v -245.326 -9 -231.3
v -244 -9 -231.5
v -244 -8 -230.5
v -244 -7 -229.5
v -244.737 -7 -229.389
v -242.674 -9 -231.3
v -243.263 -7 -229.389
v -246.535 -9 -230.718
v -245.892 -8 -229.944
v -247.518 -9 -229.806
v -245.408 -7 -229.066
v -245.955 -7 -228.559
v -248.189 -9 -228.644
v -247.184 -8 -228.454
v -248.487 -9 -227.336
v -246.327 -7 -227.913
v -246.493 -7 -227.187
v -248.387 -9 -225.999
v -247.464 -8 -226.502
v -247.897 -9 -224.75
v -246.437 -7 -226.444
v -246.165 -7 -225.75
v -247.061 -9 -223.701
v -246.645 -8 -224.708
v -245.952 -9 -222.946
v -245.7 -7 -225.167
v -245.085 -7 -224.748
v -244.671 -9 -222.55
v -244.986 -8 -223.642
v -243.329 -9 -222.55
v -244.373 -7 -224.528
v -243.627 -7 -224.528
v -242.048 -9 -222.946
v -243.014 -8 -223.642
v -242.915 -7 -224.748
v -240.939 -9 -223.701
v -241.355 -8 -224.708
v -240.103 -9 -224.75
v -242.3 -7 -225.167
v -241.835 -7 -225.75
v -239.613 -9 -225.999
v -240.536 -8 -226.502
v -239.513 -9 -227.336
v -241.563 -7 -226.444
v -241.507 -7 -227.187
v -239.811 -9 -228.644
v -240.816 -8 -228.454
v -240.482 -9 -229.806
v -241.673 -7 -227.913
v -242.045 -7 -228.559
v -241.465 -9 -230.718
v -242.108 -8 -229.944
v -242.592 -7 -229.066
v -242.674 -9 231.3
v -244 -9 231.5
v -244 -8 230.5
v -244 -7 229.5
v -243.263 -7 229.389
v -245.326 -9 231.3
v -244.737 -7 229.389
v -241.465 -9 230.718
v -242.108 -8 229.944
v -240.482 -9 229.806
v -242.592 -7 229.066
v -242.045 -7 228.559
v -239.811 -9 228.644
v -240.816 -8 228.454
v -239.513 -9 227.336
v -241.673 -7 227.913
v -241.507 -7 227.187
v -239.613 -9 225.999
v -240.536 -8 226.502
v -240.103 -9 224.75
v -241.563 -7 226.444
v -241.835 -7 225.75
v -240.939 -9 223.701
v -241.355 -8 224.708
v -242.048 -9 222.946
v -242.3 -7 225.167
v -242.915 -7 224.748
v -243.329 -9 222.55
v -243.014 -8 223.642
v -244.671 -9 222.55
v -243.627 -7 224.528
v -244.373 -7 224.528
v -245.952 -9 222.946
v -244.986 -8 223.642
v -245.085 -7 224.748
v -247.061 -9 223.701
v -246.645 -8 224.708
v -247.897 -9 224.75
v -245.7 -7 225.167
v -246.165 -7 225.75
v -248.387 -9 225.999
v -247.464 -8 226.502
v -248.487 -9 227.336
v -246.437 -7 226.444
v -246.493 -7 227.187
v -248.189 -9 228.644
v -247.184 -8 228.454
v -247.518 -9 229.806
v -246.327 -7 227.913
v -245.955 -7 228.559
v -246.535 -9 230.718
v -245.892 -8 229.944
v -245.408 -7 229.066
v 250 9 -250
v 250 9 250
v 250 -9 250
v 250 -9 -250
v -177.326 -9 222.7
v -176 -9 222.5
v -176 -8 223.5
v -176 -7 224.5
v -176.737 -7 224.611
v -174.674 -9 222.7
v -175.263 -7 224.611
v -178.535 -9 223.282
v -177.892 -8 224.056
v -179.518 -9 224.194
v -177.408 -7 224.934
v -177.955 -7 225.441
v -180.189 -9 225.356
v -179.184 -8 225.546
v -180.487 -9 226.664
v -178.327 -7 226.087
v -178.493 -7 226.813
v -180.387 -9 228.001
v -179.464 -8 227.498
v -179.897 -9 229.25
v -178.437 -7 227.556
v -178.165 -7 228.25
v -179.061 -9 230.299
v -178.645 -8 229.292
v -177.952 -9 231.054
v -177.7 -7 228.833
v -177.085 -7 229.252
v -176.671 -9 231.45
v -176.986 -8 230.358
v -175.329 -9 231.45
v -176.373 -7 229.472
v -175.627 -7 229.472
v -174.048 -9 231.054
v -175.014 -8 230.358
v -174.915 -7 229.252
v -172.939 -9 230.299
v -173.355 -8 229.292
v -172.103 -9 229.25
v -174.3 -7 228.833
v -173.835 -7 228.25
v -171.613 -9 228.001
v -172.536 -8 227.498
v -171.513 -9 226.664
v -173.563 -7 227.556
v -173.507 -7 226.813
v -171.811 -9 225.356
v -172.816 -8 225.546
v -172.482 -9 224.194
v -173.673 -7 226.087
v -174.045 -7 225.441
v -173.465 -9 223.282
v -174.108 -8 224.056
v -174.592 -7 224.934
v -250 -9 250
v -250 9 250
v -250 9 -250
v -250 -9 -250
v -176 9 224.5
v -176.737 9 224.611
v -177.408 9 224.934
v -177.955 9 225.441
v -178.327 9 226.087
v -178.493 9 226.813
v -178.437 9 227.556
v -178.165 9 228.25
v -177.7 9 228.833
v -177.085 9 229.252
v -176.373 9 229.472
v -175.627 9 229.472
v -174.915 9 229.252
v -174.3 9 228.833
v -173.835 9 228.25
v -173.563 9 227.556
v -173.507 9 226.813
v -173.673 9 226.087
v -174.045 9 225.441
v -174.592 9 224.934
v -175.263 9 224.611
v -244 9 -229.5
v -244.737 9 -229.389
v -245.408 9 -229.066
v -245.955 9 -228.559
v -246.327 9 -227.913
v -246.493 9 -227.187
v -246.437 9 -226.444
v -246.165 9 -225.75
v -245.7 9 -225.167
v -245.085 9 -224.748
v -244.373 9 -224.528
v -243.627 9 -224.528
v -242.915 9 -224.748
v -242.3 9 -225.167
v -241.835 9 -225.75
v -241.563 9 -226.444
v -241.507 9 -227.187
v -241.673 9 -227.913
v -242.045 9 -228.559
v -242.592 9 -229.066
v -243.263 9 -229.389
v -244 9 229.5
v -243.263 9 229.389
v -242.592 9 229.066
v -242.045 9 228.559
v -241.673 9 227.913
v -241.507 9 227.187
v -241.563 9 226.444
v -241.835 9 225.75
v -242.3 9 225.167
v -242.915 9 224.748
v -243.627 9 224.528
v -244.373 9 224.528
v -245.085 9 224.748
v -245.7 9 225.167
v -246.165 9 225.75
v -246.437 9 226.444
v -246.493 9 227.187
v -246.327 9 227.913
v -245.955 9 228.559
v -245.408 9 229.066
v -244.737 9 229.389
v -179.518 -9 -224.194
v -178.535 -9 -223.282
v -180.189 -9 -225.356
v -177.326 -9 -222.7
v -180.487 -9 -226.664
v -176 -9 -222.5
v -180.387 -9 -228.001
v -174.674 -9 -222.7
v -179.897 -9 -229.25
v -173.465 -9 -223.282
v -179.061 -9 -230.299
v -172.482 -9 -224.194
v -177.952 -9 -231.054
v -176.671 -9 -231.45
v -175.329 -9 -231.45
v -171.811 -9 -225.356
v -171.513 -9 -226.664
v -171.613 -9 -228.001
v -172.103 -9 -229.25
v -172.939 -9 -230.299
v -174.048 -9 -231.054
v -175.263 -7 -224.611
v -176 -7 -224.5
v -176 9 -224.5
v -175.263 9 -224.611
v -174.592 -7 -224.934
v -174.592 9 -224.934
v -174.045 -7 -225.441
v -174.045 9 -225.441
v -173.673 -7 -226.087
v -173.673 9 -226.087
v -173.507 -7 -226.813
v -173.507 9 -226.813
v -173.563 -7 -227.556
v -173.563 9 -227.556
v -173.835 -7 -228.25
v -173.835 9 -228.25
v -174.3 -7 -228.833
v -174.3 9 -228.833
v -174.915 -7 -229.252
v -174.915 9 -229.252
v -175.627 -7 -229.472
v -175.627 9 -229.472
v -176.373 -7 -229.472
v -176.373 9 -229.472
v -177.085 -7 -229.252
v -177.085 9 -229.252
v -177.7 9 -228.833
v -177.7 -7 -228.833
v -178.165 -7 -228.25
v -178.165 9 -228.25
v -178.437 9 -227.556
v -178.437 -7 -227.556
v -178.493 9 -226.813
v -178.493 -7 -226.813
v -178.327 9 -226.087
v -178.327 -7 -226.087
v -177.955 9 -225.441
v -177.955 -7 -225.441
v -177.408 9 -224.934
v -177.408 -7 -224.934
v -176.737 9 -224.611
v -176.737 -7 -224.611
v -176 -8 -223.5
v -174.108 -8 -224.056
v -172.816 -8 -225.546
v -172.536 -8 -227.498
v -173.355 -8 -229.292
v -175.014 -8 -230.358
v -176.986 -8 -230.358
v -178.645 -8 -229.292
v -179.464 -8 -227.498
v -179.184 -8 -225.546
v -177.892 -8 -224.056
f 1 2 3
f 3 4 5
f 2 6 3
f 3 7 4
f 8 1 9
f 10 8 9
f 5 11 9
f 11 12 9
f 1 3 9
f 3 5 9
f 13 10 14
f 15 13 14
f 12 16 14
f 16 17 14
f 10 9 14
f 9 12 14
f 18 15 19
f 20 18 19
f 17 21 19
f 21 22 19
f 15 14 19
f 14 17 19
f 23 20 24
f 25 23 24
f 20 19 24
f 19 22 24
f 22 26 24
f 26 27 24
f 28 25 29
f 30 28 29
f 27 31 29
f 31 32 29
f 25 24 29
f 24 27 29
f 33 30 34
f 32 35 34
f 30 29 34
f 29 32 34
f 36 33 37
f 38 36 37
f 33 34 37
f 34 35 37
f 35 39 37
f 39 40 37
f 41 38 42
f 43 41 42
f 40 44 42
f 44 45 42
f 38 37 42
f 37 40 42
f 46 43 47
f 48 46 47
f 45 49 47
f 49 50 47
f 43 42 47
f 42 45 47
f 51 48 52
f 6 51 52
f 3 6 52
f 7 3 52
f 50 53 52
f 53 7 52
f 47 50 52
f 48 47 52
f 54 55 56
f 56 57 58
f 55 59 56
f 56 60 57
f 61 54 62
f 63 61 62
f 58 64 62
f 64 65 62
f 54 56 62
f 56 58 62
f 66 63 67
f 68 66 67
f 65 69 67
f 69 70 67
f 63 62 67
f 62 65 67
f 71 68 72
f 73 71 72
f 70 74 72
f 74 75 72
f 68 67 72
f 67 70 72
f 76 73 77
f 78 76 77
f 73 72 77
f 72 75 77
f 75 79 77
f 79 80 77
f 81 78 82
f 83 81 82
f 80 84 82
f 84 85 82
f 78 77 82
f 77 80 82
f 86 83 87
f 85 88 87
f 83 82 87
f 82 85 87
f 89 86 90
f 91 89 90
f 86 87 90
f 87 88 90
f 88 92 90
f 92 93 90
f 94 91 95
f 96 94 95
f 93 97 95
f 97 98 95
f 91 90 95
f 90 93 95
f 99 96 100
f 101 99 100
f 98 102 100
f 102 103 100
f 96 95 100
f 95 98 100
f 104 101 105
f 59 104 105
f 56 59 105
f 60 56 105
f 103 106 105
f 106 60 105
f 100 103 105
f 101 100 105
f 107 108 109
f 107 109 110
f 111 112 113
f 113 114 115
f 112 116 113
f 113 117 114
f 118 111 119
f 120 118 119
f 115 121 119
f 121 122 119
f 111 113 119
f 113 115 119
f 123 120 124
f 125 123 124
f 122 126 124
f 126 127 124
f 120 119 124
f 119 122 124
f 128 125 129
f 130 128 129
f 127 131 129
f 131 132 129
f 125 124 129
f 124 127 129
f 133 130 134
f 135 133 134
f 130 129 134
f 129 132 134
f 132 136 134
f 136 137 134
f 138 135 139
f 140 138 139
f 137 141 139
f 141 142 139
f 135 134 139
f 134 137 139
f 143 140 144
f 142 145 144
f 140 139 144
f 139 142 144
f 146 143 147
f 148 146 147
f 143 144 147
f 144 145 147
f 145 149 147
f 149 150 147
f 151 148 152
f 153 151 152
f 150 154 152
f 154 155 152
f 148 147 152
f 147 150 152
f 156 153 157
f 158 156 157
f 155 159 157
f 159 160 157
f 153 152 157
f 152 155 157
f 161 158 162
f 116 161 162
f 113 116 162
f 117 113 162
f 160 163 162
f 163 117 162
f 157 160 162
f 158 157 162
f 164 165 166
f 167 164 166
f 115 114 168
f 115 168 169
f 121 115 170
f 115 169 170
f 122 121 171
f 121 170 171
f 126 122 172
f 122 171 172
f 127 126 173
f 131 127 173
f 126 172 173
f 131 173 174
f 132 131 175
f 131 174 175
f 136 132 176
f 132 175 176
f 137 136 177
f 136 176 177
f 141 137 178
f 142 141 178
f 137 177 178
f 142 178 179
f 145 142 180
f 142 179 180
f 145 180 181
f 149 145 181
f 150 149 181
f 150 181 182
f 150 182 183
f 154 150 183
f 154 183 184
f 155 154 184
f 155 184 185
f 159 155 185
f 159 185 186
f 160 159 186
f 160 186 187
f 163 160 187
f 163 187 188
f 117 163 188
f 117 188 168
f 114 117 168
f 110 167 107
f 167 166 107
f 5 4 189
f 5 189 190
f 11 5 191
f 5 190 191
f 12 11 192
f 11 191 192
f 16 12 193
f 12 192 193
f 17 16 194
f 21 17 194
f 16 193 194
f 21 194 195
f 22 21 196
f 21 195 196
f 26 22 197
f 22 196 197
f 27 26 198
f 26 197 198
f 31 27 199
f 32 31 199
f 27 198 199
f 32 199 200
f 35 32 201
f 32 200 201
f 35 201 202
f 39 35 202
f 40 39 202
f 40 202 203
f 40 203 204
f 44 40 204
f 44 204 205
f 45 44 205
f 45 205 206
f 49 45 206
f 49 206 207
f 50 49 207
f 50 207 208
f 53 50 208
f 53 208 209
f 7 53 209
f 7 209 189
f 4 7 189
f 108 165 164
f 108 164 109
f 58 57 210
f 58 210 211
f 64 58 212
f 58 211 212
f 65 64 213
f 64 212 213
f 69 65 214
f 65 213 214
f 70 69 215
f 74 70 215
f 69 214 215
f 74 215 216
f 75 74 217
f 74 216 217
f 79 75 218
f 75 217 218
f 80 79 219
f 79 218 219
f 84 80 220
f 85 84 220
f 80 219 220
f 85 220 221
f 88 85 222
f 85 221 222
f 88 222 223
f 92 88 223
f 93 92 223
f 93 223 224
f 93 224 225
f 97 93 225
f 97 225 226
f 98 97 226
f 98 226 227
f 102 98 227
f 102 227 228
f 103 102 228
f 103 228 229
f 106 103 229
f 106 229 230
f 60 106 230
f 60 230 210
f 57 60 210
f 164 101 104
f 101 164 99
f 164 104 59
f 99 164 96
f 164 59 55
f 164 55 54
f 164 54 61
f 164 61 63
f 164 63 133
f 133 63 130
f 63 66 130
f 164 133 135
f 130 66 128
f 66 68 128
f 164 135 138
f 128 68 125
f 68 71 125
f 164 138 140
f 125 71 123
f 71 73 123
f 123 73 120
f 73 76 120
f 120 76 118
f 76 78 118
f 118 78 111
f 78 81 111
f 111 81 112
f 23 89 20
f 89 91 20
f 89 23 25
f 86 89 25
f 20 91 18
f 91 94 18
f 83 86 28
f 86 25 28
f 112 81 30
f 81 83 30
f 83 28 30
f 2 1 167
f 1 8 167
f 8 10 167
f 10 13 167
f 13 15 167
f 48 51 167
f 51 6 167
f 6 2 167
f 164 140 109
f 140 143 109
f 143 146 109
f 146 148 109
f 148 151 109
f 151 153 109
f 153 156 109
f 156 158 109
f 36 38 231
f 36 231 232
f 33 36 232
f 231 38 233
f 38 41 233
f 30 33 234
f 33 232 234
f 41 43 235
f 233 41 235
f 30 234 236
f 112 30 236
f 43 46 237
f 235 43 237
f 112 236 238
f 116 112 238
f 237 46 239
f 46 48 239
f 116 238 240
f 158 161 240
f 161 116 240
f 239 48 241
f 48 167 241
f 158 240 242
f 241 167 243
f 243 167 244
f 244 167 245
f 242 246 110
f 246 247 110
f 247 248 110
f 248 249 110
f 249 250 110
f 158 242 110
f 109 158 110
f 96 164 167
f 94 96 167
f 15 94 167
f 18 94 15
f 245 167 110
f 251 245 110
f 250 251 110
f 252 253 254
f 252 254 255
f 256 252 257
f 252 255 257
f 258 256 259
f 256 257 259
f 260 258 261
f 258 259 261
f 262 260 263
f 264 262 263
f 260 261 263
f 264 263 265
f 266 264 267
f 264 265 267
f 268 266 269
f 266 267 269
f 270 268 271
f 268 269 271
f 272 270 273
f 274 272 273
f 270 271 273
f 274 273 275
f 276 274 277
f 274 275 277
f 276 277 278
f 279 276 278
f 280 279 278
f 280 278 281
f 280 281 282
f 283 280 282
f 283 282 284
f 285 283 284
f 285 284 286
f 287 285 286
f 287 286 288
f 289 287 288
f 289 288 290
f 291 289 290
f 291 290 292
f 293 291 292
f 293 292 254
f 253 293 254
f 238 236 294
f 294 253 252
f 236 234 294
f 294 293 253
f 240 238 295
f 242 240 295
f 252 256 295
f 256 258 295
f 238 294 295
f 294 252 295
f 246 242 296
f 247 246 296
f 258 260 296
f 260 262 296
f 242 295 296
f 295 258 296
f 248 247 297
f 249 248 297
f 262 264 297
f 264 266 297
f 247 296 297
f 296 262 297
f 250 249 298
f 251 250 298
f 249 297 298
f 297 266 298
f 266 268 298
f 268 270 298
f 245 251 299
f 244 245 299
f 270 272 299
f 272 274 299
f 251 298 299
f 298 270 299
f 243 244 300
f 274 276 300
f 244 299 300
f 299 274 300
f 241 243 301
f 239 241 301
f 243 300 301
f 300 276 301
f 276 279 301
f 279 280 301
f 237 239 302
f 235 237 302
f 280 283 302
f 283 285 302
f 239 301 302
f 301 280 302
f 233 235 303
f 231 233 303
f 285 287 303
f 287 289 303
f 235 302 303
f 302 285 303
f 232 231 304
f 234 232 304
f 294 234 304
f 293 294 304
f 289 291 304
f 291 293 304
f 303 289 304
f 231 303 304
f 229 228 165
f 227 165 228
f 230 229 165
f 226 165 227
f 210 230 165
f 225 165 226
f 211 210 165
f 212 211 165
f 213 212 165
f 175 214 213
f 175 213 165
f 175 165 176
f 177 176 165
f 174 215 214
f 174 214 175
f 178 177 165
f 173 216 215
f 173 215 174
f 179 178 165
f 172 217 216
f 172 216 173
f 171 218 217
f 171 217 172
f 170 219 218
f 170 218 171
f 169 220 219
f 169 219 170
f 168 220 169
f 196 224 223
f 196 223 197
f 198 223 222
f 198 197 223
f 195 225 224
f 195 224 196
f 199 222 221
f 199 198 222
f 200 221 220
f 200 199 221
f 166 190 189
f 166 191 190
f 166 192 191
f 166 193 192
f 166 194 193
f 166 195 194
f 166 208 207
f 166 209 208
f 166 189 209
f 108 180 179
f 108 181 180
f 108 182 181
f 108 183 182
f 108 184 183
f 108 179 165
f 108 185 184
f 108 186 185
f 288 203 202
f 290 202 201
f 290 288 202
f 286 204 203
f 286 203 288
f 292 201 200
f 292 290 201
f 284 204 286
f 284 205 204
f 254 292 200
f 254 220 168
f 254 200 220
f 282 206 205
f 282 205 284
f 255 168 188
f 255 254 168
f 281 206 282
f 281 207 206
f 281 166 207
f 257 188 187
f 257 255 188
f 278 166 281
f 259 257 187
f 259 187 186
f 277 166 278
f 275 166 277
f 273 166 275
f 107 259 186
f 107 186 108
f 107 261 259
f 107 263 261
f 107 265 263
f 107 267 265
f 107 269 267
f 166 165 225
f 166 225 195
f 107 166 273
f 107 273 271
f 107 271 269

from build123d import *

# Parameters (mm, degrees)
SKETCH1_W           = 500
SKETCH1_H           = 500
BOSS_EXTRUDE2_DEPTH = 9
SKETCH2_R           = 2.5
CUT_EXTRUDE1_DEPTH  = 355.011299255
CHAMFER1_SIZE       = 2


with BuildPart() as part:
    # Sketch1 → Boss-Extrude2 (new, symmetric)
    with BuildSketch(Plane(origin=(0, 0, 0), x_dir=(1, 0, 0), z_dir=(0, 1, 0))):
        Rectangle(SKETCH1_W, SKETCH1_H)
    extrude(amount=BOSS_EXTRUDE2_DEPTH, both=True)

    # Sketch2 → Cut-Extrude1 (cut, through all)
    with BuildSketch(Plane(origin=(0, 9, 0), x_dir=(1, 0, 0), z_dir=(0, 1, 0))):
        with Locations(Location((-176, 227, 0), (0, 0, 270))):
            Circle(SKETCH2_R)
        with Locations(Location((-244, 227, 0), (0, 0, 90))):
            Circle(SKETCH2_R)
        with Locations(Location((-244, -227, 0), (0, 0, 270))):
            Circle(SKETCH2_R)
        with Locations(Location((-176, -227, 0), (0, 0, 90))):
            Circle(SKETCH2_R)
    extrude(amount=-CUT_EXTRUDE1_DEPTH, mode=Mode.SUBTRACT)

    # Chamfer1
    chamfer1_edges = [part.edges().sort_by_distance(p)[0] for p in [
        (-244, -9, -224.5),
        (-176, -9, -229.5),
        (-176, -9, 229.5),
        (-244, -9, 224.5),
    ]]
    chamfer(chamfer1_edges, length=CHAMFER1_SIZE)


solid = part.part
